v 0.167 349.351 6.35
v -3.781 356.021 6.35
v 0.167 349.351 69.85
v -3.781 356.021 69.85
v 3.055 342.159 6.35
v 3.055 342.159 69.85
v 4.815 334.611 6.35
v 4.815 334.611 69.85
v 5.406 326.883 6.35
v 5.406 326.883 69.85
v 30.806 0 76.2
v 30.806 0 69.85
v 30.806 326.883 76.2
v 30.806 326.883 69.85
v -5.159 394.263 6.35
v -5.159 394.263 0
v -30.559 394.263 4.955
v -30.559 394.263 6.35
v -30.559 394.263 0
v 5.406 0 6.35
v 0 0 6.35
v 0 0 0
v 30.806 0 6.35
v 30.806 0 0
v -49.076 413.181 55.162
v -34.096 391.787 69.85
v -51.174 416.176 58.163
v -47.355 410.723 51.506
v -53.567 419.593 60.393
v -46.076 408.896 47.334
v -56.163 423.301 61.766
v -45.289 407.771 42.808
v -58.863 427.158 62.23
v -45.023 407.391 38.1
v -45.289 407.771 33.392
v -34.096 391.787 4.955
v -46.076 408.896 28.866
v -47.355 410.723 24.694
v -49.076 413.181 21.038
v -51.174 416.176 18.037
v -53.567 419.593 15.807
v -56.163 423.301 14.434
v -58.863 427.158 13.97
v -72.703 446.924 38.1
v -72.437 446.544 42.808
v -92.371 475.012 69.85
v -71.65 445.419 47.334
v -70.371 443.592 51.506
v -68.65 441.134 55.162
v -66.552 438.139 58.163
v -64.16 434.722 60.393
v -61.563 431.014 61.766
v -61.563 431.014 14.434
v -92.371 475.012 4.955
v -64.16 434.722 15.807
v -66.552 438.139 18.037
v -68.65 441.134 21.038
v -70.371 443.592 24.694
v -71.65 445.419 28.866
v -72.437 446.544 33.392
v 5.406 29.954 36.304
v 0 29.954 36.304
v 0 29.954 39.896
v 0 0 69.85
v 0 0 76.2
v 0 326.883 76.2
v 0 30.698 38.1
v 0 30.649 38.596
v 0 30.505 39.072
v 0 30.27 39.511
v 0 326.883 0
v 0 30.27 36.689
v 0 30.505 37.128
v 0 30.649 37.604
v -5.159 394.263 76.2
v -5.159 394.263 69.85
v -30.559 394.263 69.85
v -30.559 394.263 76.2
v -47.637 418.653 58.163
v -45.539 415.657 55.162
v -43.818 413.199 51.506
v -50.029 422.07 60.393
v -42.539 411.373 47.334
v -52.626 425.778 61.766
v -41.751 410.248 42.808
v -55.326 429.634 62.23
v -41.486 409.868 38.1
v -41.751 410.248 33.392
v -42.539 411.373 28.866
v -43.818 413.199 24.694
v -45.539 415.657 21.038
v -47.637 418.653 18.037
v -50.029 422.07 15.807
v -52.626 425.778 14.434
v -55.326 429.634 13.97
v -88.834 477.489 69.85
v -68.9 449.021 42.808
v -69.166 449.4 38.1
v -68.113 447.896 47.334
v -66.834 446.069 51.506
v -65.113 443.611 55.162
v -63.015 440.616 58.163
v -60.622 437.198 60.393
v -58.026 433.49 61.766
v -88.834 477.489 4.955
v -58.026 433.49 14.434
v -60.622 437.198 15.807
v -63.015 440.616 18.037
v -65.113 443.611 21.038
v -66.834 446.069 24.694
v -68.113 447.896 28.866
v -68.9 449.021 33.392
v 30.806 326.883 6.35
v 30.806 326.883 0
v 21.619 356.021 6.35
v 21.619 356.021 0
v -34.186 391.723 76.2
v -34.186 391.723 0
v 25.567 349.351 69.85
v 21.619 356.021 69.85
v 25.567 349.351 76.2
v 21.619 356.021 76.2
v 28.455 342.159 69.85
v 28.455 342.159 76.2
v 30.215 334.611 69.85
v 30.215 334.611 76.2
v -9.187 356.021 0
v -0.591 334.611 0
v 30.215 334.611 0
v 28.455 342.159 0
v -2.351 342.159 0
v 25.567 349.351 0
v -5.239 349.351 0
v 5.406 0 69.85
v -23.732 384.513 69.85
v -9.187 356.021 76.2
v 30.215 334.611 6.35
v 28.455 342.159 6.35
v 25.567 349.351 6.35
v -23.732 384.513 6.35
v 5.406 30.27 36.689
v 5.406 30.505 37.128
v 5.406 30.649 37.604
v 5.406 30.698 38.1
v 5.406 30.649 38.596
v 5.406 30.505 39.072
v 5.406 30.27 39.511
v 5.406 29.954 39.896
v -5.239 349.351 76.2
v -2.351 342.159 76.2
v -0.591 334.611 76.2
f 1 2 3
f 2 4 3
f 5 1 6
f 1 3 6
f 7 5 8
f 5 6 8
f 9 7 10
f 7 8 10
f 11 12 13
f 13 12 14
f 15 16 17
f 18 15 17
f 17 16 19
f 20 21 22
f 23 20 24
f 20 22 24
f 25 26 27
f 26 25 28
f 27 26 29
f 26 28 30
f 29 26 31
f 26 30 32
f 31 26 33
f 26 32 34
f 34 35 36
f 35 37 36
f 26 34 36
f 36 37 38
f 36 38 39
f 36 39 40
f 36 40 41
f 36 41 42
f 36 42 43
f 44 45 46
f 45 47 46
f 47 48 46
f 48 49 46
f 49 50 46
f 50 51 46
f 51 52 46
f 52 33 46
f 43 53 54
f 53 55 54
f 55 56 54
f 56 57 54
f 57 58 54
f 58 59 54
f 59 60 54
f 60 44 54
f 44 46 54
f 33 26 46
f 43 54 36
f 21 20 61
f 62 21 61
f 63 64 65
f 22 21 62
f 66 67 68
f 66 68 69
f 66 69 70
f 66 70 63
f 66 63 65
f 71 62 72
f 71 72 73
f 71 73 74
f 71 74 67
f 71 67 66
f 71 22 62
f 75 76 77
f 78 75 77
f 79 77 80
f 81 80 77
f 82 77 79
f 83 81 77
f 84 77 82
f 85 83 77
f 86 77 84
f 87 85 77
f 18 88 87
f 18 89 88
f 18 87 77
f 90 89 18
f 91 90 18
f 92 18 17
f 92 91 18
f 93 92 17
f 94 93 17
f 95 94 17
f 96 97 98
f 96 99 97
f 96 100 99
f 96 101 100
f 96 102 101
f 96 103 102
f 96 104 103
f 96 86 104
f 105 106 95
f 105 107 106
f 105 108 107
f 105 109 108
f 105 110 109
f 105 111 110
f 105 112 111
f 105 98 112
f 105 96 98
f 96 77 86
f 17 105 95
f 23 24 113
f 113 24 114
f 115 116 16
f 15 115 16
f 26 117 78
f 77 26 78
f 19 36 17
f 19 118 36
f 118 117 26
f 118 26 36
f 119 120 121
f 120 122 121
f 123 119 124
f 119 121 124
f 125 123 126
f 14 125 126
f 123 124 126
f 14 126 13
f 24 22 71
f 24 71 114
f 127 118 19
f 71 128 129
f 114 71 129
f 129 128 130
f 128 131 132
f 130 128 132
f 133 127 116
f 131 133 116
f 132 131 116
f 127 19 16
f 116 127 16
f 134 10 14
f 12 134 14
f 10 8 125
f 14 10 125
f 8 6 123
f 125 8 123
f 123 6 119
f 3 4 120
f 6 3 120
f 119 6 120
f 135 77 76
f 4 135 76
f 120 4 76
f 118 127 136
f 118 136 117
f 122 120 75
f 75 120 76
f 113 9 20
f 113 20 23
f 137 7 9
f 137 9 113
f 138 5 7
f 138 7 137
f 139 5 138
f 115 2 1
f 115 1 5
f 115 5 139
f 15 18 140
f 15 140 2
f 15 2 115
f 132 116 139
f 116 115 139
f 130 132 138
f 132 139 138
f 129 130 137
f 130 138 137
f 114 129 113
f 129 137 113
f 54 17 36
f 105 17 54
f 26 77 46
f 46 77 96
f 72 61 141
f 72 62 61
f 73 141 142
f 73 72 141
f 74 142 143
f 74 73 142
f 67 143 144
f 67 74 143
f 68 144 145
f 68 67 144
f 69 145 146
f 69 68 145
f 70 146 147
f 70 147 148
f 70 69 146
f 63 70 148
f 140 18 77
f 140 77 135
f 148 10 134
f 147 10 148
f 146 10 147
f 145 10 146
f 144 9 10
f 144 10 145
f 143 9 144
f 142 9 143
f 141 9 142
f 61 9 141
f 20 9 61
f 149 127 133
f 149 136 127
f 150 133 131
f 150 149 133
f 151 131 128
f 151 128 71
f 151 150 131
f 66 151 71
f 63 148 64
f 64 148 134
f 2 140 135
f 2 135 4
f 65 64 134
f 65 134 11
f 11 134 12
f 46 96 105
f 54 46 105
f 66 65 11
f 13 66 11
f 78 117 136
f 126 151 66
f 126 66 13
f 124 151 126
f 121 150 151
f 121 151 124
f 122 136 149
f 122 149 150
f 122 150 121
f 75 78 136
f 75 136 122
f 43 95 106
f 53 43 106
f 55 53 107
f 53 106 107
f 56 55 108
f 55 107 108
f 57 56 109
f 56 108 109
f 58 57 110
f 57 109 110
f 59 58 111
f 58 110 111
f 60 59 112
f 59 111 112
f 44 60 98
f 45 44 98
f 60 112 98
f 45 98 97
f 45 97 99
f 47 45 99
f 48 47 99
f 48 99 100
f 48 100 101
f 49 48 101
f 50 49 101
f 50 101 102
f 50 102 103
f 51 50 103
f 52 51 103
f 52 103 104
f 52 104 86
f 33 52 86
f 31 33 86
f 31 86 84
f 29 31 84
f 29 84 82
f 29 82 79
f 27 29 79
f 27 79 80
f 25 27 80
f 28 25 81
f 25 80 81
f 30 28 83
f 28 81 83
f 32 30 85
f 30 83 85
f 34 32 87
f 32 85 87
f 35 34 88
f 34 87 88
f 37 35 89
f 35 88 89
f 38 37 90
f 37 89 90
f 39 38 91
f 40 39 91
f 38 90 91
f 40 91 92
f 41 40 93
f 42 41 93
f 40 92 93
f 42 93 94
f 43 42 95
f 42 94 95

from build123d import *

# Parameters (mm, degrees)
BOSS_EXTRUDE1_DEPTH     = 76.2
BOSS_EXTRUDE8_DEPTH     = 6.35
LPATTERN3_COUNT         = 2
LPATTERN3_PITCH         = 69.85
FILLET2_R               = 50.8
SKETCH12_W              = 64.895089707
SKETCH12_H              = 101.6
BOSS_EXTRUDE10_DEPTH    = 4.318
TOP_CIRCLE_CUT_REACH    = 278.774
SKETCH10_R              = 24.13
CUT_EXTRUDE2_DEPTH      = 26.4
CUT_EXTRUDE2_DEPTH_BACK = 98.777385928
FILLET3_R               = 2.54


with BuildPart() as part:
    # Sketch1 → Boss-Extrude1 (new body)
    with BuildSketch(Plane.XY):
        Polygon((0, 0), (0, 342.9), (-34.18639432, 391.723230906), (-30.558898383, 394.263230906), (-23.731659882, 384.51292385), (5.406023084, 342.9), (5.406023084, 0), align=None)
    extrude(amount=BOSS_EXTRUDE1_DEPTH)

    # Sketch9 → Boss-Extrude8 (add)
    with BuildSketch(Plane.XY):
        Polygon((5.406023084, 0), (30.806023084, 0), (30.806023084, 342.9), (-5.158898383, 394.263230906), (-30.558898383, 394.263230906), (5.406023084, 342.9), align=None)
    boss_extrude8 = extrude(amount=BOSS_EXTRUDE8_DEPTH)

    # LPattern3: Boss-Extrude8 ×2
    with Locations(*[(0, 0, i * LPATTERN3_PITCH) for i in range(1, LPATTERN3_COUNT)]):
        add(boss_extrude8)

    # Fillet2
    fillet2_edges = [part.edges().sort_by_distance(p)[0] for p in [
        (0, 342.9, 38.1),
        (30.806023084, 342.9, 3.175),
        (5.406023084, 342.9, 38.1),
        (30.806023084, 342.9, 73.025),
    ]]
    fillet(fillet2_edges, radius=FILLET2_R)

    # Sketch12 → Boss-Extrude10 (add)
    with BuildSketch(Plane(origin=(164.737795771, 115.350646427, 0), x_dir=(0, 0, -1), z_dir=(0.819152044, 0.573576436, 0))):
        with Locations((-37.402455147, 391.289395618)):
            Rectangle(SKETCH12_W, SKETCH12_H)
    extrude(amount=-BOSS_EXTRUDE10_DEPTH)

    # Sketch10 → Top Circle Cut (cut, up to next)
    with BuildSketch(Plane(origin=(164.737795771, 115.350646427, 0), x_dir=(0, 0, -1), z_dir=(0.819152044, 0.573576436, 0)), mode=Mode.PRIVATE) as top_circle_cut_sk1:
        with Locations((-38.1, 383.669395618)):
            Circle(SKETCH10_R)
    top_circle_cut_tool1 = extrude(top_circle_cut_sk1.sketch, amount=-TOP_CIRCLE_CUT_REACH, mode=Mode.PRIVATE) & part.part
    add(top_circle_cut_tool1.solids().sort_by_distance((-55.325929, 429.634216, 38.1))[0], mode=Mode.SUBTRACT)

    # Sketch13 → Cut-Extrude2 (cut, two sides)
    with BuildSketch(Plane(origin=(5.406023084, 0, 0), x_dir=(0, 0, -1), z_dir=(1, 0, 0))) as cut_extrude2_sk:
        Polygon((-38.1, 31.75), (-69.85, 0), (-6.35, 0), align=None)
    extrude(amount=CUT_EXTRUDE2_DEPTH, mode=Mode.SUBTRACT)
    extrude(cut_extrude2_sk.sketch, amount=-CUT_EXTRUDE2_DEPTH_BACK, mode=Mode.SUBTRACT)

    # Fillet3
    fillet3_edges = [part.edges().sort_by_distance(p)[0] for p in [
        (2.703011542, 31.75, 38.1),
    ]]
    fillet(fillet3_edges, radius=FILLET3_R)


solid = part.part
